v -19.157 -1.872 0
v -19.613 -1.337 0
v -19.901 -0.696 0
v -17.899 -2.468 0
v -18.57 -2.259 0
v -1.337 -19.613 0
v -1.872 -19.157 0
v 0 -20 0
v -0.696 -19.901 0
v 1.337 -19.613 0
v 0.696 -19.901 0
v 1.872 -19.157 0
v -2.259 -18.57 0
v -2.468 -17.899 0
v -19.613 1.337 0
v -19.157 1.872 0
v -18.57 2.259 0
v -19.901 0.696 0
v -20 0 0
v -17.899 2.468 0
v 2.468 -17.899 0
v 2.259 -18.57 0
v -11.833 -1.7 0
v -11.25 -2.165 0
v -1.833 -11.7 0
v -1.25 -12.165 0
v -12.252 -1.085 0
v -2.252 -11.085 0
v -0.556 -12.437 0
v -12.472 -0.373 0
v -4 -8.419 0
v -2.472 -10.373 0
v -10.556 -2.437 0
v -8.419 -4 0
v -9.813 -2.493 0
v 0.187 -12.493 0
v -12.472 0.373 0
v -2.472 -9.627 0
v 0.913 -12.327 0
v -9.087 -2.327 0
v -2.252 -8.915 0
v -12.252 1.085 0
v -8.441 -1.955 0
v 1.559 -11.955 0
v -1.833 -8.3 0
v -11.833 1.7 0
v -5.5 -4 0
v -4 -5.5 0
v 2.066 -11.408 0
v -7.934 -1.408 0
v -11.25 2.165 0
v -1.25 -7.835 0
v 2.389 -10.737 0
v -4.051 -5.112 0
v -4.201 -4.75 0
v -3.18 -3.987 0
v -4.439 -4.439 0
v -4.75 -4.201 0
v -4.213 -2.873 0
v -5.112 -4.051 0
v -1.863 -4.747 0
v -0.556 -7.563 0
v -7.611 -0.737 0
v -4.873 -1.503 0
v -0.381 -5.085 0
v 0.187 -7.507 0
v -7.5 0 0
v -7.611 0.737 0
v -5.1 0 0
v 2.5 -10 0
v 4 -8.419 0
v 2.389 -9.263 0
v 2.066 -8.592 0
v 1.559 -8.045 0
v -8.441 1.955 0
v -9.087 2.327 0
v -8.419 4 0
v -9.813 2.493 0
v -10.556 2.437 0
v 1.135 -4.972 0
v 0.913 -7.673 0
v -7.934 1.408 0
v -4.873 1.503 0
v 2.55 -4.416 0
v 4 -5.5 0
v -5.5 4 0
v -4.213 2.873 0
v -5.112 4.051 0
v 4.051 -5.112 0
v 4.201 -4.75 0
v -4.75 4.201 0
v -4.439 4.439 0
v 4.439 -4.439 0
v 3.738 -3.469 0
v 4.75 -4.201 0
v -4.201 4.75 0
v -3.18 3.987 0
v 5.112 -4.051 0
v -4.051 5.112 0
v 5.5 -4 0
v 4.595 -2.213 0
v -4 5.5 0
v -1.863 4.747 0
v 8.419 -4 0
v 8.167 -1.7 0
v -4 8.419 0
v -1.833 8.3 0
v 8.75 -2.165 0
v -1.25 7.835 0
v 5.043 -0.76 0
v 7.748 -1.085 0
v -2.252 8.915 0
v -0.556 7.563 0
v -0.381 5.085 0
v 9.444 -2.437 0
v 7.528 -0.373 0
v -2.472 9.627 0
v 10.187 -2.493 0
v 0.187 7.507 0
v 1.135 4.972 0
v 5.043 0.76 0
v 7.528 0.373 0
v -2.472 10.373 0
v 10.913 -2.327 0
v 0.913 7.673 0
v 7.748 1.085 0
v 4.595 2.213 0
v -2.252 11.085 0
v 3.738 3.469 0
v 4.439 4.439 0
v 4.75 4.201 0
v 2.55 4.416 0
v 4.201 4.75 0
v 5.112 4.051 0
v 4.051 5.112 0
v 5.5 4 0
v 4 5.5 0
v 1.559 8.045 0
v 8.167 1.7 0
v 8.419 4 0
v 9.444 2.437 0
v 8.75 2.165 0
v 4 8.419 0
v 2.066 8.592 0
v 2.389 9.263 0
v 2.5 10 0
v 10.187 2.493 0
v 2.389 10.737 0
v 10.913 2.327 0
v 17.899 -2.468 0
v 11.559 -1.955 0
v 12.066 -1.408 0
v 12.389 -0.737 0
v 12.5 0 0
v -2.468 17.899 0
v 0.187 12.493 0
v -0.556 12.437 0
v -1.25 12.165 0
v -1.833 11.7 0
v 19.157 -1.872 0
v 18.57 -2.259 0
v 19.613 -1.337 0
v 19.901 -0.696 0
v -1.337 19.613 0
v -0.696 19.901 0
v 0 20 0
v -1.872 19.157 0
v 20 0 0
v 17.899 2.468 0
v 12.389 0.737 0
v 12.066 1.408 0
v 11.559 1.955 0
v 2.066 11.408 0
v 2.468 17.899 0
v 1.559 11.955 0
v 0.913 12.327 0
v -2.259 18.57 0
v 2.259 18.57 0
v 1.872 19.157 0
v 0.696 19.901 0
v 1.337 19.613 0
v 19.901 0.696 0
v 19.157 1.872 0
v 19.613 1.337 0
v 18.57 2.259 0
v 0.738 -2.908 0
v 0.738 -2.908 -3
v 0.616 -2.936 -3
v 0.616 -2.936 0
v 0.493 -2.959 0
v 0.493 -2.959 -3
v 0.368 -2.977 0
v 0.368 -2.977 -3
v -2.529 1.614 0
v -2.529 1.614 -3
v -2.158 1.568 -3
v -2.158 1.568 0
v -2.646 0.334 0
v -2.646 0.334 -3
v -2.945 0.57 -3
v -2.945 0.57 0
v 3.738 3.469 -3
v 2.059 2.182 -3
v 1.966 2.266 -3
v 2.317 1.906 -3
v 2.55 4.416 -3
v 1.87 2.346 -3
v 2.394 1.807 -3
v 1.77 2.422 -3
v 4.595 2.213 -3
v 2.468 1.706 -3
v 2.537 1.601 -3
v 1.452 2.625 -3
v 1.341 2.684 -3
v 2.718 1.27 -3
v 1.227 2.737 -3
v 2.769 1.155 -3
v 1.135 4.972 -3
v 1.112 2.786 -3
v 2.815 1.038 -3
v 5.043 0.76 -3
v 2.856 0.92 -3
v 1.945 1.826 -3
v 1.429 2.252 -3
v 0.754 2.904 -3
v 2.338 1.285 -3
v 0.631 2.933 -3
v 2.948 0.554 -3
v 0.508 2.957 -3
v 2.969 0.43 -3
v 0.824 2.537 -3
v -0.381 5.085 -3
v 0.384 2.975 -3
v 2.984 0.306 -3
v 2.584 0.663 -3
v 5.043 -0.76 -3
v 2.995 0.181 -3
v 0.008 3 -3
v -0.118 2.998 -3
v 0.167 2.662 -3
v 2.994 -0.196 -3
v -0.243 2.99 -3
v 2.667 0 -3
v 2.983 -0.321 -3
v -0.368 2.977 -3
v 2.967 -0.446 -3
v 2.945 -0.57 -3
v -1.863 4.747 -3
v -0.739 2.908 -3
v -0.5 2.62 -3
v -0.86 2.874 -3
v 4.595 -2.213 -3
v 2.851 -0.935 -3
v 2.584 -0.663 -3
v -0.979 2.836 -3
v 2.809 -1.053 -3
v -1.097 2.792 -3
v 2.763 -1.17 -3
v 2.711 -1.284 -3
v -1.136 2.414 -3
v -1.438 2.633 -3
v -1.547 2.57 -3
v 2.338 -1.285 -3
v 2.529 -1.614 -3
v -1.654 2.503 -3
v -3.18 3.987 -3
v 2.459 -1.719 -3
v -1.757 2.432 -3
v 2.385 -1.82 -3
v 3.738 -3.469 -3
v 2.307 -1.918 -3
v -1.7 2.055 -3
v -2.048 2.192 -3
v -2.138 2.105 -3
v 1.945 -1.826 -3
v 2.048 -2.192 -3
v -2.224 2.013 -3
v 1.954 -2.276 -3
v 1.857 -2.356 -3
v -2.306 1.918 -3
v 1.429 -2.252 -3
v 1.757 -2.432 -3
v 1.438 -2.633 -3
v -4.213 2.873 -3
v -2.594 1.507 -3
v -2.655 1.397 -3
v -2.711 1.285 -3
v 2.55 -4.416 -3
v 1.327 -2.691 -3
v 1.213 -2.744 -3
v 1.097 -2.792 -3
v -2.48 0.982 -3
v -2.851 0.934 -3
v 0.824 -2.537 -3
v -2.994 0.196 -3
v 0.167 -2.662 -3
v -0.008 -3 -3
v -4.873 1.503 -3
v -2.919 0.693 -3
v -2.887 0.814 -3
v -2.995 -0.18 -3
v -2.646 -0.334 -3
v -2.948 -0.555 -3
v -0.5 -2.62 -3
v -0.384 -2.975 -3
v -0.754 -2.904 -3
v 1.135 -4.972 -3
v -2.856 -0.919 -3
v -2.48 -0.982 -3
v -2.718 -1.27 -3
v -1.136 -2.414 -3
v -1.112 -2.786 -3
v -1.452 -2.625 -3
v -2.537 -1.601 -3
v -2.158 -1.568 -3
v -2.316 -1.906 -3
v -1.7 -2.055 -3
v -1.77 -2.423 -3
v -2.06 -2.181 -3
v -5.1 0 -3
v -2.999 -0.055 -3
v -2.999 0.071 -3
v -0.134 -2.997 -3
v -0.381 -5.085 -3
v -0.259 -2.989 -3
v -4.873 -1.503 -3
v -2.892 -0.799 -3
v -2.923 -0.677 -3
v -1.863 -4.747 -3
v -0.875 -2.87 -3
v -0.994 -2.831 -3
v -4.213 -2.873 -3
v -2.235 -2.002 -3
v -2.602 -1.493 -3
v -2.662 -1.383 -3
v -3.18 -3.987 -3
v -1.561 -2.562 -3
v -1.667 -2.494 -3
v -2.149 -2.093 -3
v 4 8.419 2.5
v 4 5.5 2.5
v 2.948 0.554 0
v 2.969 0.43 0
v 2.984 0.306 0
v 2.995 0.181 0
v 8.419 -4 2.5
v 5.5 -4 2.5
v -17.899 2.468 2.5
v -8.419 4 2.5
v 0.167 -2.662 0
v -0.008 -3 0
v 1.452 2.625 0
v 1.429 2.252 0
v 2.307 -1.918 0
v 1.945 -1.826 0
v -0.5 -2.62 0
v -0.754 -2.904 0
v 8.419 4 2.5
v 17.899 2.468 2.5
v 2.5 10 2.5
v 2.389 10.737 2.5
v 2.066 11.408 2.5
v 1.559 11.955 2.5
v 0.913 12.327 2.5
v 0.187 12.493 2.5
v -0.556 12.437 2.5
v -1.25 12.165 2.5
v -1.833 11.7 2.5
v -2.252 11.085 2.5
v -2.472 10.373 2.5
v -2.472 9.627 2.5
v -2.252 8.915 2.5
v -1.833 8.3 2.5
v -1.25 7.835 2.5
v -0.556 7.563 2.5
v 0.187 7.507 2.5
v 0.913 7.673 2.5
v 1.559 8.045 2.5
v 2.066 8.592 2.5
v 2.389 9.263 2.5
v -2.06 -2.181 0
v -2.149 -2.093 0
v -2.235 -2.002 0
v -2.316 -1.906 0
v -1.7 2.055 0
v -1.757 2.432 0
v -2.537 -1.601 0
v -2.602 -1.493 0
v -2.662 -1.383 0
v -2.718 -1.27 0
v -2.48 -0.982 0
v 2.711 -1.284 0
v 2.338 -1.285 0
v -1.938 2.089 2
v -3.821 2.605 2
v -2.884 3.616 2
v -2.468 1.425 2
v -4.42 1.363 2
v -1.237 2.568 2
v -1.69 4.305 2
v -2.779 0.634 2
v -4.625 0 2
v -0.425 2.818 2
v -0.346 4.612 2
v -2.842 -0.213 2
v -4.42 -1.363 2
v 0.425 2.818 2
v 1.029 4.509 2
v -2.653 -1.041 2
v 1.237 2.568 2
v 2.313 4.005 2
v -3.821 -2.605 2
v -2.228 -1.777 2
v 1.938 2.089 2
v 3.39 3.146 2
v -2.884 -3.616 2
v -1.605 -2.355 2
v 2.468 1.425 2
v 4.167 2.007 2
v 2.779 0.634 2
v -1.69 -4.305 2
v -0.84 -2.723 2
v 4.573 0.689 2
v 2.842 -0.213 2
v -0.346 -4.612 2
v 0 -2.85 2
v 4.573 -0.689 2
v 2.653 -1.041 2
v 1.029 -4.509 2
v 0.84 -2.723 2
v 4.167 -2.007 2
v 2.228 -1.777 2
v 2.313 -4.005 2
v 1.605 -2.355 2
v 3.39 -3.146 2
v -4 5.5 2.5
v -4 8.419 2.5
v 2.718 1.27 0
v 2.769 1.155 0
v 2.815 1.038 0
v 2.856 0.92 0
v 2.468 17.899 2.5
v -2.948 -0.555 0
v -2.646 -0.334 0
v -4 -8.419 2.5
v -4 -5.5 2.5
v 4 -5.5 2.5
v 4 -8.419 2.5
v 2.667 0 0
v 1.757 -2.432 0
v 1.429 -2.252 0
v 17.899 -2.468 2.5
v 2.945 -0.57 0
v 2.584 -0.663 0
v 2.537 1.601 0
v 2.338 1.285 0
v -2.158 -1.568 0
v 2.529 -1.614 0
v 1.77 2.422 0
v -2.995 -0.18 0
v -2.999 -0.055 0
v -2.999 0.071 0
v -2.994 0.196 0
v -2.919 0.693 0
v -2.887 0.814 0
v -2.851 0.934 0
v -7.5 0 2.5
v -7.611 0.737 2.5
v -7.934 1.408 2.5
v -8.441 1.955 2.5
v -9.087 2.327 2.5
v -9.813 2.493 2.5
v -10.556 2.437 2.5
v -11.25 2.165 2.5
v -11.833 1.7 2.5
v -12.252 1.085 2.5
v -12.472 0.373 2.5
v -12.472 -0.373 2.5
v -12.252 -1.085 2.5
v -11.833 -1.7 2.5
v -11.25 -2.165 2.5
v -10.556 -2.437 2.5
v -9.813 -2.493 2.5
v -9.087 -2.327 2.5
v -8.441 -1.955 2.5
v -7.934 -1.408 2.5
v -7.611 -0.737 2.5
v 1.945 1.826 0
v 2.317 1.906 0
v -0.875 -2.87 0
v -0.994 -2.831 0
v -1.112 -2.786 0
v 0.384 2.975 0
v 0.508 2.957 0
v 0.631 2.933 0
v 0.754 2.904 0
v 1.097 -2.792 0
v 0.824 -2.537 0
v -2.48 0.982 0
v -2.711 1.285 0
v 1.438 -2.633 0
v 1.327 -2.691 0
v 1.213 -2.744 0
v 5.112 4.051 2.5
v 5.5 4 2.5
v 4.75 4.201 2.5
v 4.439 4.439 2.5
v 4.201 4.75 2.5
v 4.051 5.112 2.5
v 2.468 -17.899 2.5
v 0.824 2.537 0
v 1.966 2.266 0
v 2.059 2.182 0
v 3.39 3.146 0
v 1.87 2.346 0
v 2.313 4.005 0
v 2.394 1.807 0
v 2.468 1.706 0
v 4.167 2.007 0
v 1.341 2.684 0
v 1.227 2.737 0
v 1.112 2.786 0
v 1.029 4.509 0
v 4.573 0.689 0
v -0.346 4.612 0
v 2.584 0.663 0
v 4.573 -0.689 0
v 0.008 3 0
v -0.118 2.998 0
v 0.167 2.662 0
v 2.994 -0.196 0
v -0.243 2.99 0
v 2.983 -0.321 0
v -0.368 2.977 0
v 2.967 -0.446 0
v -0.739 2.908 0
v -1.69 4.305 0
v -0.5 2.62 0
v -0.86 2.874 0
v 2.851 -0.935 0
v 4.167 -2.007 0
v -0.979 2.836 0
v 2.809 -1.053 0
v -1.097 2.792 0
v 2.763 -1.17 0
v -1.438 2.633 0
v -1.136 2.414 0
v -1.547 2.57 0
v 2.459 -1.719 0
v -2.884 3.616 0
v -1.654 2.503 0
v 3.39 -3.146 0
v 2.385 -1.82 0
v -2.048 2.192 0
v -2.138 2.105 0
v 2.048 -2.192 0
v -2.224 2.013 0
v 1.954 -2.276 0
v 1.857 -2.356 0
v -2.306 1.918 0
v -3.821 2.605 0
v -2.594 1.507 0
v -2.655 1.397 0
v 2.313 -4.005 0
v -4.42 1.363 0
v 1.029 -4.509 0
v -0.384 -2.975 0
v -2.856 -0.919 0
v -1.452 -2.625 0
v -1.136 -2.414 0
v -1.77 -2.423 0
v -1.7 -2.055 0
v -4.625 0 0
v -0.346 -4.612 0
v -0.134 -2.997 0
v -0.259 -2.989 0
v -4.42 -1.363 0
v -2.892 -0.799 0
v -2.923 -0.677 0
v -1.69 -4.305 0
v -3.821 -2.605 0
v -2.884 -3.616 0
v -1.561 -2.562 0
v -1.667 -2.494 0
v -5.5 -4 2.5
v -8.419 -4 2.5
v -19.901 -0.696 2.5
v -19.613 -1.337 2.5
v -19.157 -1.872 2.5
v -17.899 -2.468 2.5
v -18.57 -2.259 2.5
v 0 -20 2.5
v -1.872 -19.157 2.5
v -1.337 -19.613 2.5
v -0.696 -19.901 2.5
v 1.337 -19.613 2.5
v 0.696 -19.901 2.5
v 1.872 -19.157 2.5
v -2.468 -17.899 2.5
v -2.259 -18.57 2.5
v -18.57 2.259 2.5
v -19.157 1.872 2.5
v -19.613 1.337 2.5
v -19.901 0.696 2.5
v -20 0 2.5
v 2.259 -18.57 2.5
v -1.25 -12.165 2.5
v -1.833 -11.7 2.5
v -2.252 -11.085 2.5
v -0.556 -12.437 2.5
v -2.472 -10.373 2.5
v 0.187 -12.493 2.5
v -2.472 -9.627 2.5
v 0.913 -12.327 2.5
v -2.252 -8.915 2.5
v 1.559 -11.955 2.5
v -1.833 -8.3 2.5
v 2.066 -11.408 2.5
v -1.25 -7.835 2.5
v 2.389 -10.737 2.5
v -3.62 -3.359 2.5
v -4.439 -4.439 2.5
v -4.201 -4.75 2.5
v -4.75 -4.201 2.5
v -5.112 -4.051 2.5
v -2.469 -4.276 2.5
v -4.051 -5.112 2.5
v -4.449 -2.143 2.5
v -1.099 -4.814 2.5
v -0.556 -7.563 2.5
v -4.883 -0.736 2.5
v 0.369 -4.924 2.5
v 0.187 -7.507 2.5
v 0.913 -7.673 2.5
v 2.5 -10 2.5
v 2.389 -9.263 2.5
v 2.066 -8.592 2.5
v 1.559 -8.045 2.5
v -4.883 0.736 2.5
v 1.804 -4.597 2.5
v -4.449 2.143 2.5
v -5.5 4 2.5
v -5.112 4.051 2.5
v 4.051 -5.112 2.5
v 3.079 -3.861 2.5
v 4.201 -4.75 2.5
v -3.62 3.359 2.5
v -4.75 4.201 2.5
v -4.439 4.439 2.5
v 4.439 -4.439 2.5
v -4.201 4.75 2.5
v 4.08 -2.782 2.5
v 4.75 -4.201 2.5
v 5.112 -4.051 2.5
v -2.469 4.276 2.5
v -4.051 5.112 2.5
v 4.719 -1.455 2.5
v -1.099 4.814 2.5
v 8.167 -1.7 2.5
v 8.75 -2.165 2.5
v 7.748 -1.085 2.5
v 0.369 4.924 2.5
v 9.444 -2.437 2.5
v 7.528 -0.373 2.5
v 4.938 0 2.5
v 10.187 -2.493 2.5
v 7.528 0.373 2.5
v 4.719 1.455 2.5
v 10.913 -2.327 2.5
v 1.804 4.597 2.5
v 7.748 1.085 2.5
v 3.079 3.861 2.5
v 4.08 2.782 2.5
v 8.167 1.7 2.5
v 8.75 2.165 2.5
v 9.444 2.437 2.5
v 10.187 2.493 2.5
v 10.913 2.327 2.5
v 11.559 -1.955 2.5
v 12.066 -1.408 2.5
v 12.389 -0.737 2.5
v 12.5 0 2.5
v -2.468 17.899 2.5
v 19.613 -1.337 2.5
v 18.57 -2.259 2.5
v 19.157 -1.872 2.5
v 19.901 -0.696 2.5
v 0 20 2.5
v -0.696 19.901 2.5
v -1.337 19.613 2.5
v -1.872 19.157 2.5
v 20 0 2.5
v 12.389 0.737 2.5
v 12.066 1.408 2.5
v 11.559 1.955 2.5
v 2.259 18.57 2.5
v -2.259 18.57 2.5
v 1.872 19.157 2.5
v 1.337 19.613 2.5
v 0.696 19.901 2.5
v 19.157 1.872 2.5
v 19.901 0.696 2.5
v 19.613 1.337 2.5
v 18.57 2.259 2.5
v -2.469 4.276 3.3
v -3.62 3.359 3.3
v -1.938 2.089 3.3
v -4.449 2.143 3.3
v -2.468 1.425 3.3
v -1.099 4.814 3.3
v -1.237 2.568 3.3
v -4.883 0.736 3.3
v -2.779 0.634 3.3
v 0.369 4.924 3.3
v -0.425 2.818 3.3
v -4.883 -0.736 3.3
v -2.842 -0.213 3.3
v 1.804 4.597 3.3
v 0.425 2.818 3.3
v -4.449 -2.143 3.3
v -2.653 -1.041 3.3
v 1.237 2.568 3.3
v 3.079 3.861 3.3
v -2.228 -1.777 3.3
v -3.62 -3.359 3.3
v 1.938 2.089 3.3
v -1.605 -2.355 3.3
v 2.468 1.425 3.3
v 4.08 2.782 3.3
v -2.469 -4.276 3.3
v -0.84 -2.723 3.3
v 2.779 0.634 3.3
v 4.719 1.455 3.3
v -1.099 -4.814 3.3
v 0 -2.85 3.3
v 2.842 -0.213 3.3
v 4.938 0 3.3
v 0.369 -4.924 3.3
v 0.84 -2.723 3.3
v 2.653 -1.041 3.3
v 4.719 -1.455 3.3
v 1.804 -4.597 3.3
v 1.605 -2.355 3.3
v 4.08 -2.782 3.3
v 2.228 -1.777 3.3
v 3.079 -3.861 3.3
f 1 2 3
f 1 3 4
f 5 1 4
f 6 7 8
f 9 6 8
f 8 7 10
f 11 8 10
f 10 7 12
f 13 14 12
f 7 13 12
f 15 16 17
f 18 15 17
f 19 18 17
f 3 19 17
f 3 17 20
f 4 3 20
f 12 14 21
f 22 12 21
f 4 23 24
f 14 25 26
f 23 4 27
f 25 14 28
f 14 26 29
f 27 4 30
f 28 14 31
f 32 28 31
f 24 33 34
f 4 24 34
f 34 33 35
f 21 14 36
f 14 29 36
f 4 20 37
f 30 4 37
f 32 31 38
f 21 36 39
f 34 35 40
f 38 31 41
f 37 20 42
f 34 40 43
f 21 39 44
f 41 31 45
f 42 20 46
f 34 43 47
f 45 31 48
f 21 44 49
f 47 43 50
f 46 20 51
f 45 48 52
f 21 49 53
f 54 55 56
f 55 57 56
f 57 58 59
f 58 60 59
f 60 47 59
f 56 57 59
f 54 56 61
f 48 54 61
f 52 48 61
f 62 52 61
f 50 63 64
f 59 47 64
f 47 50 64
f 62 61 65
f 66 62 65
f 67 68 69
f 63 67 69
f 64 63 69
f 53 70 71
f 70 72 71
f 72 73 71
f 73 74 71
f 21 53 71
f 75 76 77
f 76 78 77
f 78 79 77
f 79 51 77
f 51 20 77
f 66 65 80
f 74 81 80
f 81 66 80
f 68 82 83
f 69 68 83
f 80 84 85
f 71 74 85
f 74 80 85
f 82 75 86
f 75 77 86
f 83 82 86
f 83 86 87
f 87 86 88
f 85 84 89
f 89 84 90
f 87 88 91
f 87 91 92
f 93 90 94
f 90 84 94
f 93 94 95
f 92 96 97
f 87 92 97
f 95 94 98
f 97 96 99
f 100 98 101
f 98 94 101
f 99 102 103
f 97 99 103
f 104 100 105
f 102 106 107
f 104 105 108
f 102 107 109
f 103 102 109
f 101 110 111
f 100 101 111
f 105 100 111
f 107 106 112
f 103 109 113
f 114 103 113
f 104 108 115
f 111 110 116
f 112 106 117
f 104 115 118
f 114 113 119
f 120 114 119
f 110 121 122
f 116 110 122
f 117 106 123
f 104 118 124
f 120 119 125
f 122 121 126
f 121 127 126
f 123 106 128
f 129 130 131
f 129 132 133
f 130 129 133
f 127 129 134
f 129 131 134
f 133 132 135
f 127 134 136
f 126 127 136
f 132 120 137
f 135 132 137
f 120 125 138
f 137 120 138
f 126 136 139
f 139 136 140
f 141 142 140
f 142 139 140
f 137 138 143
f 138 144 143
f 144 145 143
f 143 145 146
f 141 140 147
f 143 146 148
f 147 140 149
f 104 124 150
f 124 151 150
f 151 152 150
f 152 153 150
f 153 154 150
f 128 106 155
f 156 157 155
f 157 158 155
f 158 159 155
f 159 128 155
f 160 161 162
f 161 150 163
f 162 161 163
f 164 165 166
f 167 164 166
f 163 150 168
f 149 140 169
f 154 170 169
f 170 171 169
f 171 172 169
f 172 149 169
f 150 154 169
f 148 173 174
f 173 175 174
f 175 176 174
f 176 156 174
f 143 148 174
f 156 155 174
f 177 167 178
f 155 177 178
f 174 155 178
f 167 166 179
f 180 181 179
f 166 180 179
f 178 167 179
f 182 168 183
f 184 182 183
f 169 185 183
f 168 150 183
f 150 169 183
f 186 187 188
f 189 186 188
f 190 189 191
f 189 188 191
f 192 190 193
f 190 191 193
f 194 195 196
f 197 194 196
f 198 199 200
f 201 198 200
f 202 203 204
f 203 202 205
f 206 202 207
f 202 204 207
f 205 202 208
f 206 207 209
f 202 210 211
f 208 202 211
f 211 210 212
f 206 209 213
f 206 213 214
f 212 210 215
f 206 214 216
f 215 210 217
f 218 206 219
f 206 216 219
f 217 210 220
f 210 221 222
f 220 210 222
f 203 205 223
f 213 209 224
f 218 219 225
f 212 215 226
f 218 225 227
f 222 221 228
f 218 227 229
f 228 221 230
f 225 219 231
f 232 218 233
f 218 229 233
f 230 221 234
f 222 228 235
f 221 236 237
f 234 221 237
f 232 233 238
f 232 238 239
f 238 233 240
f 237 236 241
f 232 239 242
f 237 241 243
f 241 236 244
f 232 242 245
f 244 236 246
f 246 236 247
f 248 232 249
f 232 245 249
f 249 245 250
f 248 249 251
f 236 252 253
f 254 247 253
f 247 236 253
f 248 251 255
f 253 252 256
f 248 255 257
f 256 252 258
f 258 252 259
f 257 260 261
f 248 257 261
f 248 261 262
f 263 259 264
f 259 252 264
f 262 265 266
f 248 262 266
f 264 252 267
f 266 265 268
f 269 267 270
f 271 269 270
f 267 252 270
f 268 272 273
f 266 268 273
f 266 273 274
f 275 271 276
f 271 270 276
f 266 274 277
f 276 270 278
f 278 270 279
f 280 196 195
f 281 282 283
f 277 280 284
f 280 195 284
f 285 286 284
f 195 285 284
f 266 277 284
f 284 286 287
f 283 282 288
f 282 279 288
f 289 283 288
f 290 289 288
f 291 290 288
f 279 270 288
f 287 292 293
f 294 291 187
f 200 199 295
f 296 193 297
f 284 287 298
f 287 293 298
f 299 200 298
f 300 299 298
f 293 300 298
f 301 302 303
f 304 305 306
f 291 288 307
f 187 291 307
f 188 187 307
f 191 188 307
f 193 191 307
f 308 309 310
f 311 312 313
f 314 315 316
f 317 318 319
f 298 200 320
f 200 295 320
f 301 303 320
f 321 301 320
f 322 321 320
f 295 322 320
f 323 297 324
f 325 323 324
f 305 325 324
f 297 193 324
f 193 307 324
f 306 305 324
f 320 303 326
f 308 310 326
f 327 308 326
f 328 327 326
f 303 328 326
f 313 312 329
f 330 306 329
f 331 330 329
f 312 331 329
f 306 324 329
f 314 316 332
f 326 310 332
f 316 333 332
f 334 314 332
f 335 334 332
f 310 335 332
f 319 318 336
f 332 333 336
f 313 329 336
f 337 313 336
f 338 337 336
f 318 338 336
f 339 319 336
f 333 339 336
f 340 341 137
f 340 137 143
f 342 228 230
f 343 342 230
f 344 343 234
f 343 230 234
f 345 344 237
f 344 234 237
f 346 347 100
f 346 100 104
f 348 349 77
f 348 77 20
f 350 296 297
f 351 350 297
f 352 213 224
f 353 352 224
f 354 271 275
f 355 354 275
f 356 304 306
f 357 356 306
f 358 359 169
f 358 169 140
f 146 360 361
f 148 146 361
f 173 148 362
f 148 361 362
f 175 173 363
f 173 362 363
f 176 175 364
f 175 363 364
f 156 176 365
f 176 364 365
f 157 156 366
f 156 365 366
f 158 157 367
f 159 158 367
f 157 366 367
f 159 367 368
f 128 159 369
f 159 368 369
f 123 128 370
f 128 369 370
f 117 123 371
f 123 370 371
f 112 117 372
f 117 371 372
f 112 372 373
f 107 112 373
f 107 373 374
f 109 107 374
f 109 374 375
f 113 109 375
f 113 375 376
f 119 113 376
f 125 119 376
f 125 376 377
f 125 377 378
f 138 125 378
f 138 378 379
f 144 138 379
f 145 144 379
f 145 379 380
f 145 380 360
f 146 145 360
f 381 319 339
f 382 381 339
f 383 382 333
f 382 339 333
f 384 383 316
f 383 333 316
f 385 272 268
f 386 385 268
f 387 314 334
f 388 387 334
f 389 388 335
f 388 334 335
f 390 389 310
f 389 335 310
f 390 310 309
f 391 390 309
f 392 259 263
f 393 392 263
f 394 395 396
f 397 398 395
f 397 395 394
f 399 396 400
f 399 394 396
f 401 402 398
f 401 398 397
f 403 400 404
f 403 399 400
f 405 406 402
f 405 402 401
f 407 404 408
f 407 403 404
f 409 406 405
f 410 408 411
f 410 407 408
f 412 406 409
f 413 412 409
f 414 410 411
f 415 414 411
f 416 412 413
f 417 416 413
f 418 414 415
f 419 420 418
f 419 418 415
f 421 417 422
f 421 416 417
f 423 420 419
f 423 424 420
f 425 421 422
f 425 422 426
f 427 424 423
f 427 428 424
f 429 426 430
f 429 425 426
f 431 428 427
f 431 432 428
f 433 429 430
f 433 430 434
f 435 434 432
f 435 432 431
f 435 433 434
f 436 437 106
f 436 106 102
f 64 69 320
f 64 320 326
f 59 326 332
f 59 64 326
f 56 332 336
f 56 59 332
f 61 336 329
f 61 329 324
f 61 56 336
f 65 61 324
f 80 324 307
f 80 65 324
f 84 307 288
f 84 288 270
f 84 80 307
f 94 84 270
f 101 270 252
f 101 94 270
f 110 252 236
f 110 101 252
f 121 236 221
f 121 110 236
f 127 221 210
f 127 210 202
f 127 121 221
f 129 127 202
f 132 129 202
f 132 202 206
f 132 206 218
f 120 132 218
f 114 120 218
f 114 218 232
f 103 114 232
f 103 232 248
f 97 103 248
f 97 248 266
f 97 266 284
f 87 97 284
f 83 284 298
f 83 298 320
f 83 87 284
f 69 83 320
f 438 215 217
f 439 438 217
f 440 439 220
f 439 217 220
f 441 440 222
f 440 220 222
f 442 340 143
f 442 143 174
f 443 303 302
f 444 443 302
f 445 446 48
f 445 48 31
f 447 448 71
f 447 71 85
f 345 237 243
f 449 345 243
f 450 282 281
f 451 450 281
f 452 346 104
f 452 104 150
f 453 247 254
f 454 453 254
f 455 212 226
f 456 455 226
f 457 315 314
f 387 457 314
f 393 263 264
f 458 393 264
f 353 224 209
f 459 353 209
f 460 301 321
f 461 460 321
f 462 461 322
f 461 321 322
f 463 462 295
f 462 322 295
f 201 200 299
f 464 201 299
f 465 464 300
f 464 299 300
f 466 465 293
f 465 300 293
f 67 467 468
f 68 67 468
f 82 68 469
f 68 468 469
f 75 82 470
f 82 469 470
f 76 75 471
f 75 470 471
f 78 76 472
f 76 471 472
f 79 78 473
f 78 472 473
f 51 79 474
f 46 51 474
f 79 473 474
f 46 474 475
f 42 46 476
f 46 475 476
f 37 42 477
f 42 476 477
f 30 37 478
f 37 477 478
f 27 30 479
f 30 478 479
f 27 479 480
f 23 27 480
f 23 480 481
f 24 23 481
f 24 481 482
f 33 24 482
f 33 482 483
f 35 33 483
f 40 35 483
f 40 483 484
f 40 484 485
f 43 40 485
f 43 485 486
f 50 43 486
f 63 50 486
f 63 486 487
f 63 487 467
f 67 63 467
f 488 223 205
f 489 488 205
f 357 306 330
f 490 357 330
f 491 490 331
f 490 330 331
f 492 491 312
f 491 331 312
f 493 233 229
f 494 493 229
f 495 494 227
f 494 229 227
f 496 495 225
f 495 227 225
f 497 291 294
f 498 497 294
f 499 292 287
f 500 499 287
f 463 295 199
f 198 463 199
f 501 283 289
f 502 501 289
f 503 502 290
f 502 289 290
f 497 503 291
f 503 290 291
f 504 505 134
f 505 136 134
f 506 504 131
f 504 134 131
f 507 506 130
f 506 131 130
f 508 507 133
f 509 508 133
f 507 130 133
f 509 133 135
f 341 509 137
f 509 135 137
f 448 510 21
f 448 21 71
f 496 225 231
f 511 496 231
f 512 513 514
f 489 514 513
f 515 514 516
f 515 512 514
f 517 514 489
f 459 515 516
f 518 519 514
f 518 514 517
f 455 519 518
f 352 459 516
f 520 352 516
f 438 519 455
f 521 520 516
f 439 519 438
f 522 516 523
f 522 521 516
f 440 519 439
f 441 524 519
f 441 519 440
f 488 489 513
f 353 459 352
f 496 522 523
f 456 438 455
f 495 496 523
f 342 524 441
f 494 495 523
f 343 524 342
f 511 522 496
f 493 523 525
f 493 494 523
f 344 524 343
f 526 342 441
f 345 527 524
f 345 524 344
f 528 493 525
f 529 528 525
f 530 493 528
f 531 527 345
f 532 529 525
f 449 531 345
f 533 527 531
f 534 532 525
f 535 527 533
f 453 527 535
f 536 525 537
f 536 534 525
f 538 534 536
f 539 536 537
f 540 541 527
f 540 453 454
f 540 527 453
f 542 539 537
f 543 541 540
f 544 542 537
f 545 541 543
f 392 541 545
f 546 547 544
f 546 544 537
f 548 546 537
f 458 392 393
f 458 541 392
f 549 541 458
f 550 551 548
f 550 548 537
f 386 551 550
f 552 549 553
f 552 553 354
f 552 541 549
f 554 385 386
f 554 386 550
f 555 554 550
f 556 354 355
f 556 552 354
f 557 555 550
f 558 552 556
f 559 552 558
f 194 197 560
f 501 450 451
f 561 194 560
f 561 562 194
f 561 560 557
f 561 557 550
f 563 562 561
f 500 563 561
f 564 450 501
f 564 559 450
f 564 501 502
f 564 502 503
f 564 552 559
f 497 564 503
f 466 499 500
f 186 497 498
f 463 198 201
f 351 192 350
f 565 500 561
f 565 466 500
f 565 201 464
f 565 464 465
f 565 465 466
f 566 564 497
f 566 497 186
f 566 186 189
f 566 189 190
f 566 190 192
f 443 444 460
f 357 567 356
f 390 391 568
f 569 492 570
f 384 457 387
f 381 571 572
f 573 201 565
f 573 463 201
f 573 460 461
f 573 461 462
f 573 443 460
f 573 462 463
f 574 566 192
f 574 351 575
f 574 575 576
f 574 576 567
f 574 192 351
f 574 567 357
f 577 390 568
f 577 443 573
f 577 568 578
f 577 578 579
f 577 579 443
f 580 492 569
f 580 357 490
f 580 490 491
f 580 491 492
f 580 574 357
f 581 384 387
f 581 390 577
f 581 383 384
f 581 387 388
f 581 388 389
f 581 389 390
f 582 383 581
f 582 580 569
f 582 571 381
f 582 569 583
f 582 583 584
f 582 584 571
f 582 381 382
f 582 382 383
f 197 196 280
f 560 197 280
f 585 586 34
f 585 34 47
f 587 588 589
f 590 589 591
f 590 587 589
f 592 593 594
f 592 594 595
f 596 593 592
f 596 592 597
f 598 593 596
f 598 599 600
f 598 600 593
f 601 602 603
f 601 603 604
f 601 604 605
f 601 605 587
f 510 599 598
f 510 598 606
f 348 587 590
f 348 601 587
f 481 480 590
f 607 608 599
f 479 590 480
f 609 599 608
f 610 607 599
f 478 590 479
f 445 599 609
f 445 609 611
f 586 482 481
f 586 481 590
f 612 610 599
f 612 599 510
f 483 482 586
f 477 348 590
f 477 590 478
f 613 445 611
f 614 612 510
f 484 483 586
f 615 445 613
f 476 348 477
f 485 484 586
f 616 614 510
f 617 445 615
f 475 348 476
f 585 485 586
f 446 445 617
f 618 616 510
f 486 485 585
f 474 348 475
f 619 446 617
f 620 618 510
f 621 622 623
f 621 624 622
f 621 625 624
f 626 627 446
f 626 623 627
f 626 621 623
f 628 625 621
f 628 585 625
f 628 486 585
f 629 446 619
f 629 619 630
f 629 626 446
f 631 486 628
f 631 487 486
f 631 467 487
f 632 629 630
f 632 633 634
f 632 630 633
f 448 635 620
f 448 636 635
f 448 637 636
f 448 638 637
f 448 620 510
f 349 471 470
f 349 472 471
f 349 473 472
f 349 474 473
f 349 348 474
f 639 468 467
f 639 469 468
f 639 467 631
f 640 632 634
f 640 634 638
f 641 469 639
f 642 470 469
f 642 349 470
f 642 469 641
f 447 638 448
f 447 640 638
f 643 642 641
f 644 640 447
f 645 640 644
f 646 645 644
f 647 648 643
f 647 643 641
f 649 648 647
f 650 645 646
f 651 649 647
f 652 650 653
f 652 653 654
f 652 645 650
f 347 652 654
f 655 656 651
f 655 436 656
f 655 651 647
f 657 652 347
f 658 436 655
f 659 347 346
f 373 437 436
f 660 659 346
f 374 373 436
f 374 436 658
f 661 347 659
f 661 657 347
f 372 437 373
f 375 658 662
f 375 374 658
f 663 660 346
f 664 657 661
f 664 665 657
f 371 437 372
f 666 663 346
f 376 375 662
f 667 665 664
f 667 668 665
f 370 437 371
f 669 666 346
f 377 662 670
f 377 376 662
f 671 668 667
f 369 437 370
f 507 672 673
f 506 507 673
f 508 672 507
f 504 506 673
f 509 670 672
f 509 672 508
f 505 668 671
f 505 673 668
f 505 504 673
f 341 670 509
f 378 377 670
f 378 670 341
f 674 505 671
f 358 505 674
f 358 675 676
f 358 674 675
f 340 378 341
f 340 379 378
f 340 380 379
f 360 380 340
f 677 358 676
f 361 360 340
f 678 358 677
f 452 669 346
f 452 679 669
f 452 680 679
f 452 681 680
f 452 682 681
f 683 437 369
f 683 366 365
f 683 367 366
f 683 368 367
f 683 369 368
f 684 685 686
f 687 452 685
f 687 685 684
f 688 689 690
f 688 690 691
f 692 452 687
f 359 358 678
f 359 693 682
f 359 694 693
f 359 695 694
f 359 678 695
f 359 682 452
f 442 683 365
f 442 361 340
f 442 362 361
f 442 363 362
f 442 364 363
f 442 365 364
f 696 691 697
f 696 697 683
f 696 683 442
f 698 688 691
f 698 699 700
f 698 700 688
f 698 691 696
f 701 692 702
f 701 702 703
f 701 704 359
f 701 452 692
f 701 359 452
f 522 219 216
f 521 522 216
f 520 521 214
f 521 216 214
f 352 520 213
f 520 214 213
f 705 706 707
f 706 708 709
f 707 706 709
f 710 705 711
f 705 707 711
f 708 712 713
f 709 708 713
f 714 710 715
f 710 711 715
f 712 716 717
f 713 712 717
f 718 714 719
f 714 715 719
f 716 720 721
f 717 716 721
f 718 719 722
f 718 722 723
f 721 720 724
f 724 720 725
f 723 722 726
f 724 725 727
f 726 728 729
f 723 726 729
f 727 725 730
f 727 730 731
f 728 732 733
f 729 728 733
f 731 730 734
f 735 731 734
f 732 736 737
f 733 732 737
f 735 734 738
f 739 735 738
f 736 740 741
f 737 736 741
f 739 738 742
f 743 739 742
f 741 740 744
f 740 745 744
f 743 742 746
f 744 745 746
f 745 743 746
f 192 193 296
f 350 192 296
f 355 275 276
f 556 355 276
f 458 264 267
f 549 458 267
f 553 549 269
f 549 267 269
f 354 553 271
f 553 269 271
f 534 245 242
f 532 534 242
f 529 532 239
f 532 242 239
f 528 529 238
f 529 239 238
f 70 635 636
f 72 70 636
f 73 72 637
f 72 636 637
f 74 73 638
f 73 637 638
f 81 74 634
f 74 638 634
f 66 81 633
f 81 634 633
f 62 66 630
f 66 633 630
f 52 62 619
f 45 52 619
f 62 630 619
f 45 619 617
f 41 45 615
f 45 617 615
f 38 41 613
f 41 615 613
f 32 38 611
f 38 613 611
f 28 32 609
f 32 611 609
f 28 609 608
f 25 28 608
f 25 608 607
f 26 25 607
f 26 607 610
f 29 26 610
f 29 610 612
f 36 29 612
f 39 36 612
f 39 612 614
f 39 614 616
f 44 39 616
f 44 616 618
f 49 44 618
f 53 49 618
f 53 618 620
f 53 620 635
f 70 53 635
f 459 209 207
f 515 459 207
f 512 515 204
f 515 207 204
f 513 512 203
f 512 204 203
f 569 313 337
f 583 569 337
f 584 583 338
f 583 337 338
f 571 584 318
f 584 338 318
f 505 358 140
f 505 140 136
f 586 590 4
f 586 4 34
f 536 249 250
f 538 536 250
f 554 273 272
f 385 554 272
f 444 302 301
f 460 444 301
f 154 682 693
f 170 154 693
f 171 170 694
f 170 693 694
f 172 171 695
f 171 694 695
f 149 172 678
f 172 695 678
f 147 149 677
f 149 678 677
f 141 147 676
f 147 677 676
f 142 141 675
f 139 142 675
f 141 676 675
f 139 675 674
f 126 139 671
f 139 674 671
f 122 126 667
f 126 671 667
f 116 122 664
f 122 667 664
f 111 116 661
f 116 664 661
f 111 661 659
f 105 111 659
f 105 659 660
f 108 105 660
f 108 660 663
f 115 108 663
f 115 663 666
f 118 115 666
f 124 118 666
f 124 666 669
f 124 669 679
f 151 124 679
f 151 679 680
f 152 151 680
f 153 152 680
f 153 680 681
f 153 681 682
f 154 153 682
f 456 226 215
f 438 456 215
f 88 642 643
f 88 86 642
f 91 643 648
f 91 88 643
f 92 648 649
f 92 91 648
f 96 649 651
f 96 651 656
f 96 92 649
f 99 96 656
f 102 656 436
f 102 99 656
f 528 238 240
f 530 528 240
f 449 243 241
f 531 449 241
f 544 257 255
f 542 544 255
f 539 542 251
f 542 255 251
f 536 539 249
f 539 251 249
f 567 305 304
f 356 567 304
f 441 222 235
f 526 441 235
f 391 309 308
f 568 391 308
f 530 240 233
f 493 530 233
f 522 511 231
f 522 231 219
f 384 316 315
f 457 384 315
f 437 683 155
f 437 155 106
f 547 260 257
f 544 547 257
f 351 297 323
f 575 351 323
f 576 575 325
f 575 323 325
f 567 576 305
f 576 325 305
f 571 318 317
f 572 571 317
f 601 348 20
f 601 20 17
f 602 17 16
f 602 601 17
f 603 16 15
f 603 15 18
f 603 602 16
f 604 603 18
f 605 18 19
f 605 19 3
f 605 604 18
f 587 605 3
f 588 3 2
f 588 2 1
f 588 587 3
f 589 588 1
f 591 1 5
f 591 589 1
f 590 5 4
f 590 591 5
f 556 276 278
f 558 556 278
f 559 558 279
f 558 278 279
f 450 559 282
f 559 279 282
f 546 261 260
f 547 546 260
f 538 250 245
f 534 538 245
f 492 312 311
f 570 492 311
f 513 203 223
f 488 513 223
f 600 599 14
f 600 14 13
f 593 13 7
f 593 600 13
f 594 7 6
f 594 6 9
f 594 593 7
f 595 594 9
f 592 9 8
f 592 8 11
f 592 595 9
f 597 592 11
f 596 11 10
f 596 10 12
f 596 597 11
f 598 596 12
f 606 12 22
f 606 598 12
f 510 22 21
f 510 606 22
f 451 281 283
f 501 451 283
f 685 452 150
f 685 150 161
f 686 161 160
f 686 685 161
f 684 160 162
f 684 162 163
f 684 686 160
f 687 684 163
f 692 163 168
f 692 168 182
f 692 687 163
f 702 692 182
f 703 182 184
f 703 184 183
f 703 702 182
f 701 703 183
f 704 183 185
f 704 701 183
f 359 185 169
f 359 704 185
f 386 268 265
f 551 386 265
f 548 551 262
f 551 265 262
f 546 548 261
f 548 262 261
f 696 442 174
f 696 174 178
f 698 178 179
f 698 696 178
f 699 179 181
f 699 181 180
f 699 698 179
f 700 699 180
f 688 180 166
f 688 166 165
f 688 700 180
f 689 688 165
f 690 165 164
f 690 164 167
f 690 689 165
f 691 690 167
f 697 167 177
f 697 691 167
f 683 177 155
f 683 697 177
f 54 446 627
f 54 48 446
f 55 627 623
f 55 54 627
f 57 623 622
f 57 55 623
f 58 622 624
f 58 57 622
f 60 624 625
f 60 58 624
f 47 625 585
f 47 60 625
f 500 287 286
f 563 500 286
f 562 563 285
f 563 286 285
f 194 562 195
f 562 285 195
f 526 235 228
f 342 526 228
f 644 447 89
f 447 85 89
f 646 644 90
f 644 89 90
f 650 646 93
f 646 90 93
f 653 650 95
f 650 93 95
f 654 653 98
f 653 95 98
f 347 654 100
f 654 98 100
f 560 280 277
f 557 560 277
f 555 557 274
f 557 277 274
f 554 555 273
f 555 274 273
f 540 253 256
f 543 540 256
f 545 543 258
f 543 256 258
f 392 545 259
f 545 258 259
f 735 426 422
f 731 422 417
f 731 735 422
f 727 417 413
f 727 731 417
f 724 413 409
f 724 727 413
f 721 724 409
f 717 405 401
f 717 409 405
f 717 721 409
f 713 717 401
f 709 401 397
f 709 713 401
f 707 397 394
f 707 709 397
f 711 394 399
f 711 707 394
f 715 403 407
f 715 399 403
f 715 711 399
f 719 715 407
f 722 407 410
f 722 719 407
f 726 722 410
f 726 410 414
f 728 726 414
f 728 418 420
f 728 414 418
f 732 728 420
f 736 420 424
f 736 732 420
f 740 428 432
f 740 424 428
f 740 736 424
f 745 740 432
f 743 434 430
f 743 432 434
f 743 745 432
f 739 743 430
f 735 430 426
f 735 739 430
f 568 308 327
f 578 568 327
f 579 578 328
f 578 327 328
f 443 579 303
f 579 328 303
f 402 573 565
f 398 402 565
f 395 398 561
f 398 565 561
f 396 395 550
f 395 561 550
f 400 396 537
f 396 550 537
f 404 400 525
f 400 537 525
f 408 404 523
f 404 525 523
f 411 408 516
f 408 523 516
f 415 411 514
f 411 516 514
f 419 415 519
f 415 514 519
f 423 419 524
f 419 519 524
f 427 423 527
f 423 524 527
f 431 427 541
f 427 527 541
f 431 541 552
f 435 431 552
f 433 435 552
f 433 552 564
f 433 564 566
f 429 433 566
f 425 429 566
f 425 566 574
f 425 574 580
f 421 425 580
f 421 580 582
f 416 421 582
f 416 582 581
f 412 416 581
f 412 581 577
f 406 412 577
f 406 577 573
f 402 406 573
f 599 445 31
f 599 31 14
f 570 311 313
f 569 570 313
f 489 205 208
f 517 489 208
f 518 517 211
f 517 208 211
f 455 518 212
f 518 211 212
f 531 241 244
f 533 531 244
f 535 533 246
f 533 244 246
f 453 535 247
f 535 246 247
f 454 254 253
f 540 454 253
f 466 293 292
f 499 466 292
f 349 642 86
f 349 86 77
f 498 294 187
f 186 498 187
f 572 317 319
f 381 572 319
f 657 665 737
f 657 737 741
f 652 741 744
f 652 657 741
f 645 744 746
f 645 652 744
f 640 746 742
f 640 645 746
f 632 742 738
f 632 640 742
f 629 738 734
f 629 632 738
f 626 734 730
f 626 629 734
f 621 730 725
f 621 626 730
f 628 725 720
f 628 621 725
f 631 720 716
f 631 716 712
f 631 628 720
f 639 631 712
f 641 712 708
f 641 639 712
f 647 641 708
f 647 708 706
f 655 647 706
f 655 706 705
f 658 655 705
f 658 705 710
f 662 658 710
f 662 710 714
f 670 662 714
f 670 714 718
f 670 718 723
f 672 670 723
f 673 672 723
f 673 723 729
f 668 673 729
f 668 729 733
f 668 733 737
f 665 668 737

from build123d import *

# Parameters (mm, degrees)
BOSS_EXTRUDE1_DEPTH  = 2.5
M8_CLEARANCE_HOLE1_D = 9.25
SKETCH4_R            = 4.937986177
BOSS_EXTRUDE2_DEPTH  = 1.3
SKETCH5_R            = 5.099596851
BOSS_EXTRUDE3_DEPTH  = 3
CUT_EXTRUDE1_DEPTH   = 3.6
FILLET1_R            = 1.5
SKETCH11_R           = 2.5
CUT_EXTRUDE2_DEPTH   = 10


with BuildPart() as part:
    # Sketch1 → Boss-Extrude1 (new body)
    with BuildSketch(Plane.XY.offset(2.5)):
        with BuildLine():
            Line((4, -8.419183588), (4, -4))
            Line((4, -4), (8.419183588, -4))
            Line((8.419183588, -4), (17.898853189, -2.467978147))
            ThreePointArc((17.898853189, -2.467978147), (20, 0), (17.898853189, 2.467978147))
            Line((17.898853189, 2.467978147), (8.419183588, 4))
            Line((8.419183588, 4), (4, 4))
            Line((4, 4), (4, 8.419183588))
            Line((4, 8.419183588), (2.467978147, 17.898853189))
            ThreePointArc((2.467978147, 17.898853189), (0, 20), (-2.467978147, 17.898853189))
            Line((-2.467978147, 17.898853189), (-4, 8.419183588))
            Line((-4, 8.419183588), (-4, 4))
            Line((-4, 4), (-8.419183588, 4))
            Line((-8.419183588, 4), (-17.898853189, 2.467978147))
            ThreePointArc((-17.898853189, 2.467978147), (-20, 0), (-17.898853189, -2.467978147))
            Line((-17.898853189, -2.467978147), (-8.419183588, -4))
            Line((-8.419183588, -4), (-4, -4))
            Line((-4, -4), (-4, -8.419183588))
            Line((-4, -8.419183588), (-2.467978147, -17.898853189))
            ThreePointArc((-2.467978147, -17.898853189), (0, -20), (2.467978147, -17.898853189))
            Line((2.467978147, -17.898853189), (4, -8.419183588))
        make_face()
    extrude(amount=-BOSS_EXTRUDE1_DEPTH)

    # M8 Clearance Hole1 (through all)
    with Locations(Plane.XY.offset(2.5)):
        with Locations((0, 0)):
            Hole(M8_CLEARANCE_HOLE1_D / 2)

    # Sketch4 → Boss-Extrude2 (add)
    with BuildSketch(Plane(origin=(0, 0, 2), x_dir=(-1, 0, 0), z_dir=(0, 0, -1))):
        with Locations(Location((0, 0, 0), (0, 0, 180))):
            Circle(SKETCH4_R)
    extrude(amount=-BOSS_EXTRUDE2_DEPTH)

    # Sketch5 → Boss-Extrude3 (add)
    with BuildSketch(Plane.XY):
        with Locations(Location((0, 0, 0), (0, 0, 180))):
            Circle(SKETCH5_R)
    extrude(amount=-BOSS_EXTRUDE3_DEPTH)

    # Sketch6 → Cut-Extrude1 (cut)
    with BuildSketch(Plane(origin=(0, 0, -3), x_dir=(-1, 0, 0), z_dir=(0, 0, -1))):
        with BuildLine():
            Line((-2.994554723, 0.180671), (-2.667483, 0))
            Line((-2.667483, 0), (-2.993563417, -0.196413))
            ThreePointArc((-2.993563417, -0.196413), (-2.975345367, -0.383822804), (-2.94540633, -0.569720588))
            Line((-2.94540633, -0.569720588), (-2.583679116, -0.663376046))
            Line((-2.583679116, -0.663376046), (-2.850669191, -0.934711273))
            ThreePointArc((-2.850669191, -0.934711273), (-2.786416572, -1.111702609), (-2.711187226, -1.284314536))
            Line((-2.711187226, -1.284314536), (-2.337533172, -1.285069736))
            Line((-2.337533172, -1.285069736), (-2.528656935, -1.614278199))
            ThreePointArc((-2.528656935, -1.614278199), (-2.422406975, -1.76973005), (-2.306614256, -1.918210278))
            Line((-2.306614256, -1.918210278), (-1.944511421, -1.826017768))
            Line((-1.944511421, -1.826017768), (-2.047759865, -2.192414089))
            ThreePointArc((-2.047759865, -2.192414089), (-1.906188639, -2.316558843), (-1.75710823, -2.431577814))
            Line((-1.75710823, -2.431577814), (-1.429308867, -2.252230388))
            Line((-1.429308867, -2.252230388), (-1.438194511, -2.632792538))
            ThreePointArc((-1.438194511, -2.632792538), (-1.27019746, -2.717829725), (-1.097196632, -2.792160373))
            Line((-1.097196632, -2.792160373), (-0.824297579, -2.536927089))
            Line((-0.824297579, -2.536927089), (-0.738262106, -2.90774295))
            ThreePointArc((-0.738262106, -2.90774295), (-0.554395104, -2.948329369), (-0.368344134, -2.977301227))
            Line((-0.368344134, -2.977301227), (-0.167492643, -2.662219332))
            Line((-0.167492643, -2.662219332), (0.008058022, -2.999989178))
            ThreePointArc((0.008058022, -2.999989178), (0.196241936, -2.993574636), (0.383652781, -2.975367296))
            Line((0.383652781, -2.975367296), (0.499836471, -2.620234542))
            Line((0.499836471, -2.620234542), (0.753871834, -2.903735053))
            ThreePointArc((0.753871834, -2.903735053), (0.934548373, -2.850722599), (1.11154338, -2.786480094))
            Line((1.11154338, -2.786480094), (1.135759022, -2.41361078))
            Line((1.135759022, -2.41361078), (1.452317107, -2.625028575))
            ThreePointArc((1.452317107, -2.625028575), (1.614133699, -2.528749177), (1.769591621, -2.4225081))
            Line((1.769591621, -2.4225081), (1.700317656, -2.055330976))
            Line((1.700317656, -2.055330976), (2.059507955, -2.181381898))
            ThreePointArc((2.059507955, -2.181381898), (2.192297068, -2.047885144), (2.316449912, -1.906321013))
            Line((2.316449912, -1.906321013), (2.158039079, -1.567907168))
            Line((2.158039079, -1.567907168), (2.537292343, -1.600670974))
            ThreePointArc((2.537292343, -1.600670974), (2.63271035, -1.438344956), (2.717757136, -1.270352765))
            Line((2.717757136, -1.270352765), (2.48016297, -0.981965986))
            Line((2.48016297, -0.981965986), (2.855649322, -0.919384005))
            ThreePointArc((2.855649322, -0.919384005), (2.907700758, -0.738428265), (2.948297684, -0.554563582))
            Line((2.948297684, -0.554563582), (2.6464491, -0.33432427))
            Line((2.6464491, -0.33432427), (2.994575352, -0.180328758))
            ThreePointArc((2.994575352, -0.180328758), (2.999989634, 0.007886591), (2.993585845, 0.196070871))
            Line((2.993585845, 0.196070871), (2.6464491, 0.33432427))
            Line((2.6464491, 0.33432427), (2.945341199, 0.570057208))
            ThreePointArc((2.945341199, 0.570057208), (2.903778127, 0.753705902), (2.850775998, 0.93438547))
            Line((2.850775998, 0.93438547), (2.48016297, 0.981965986))
            Line((2.48016297, 0.981965986), (2.711040427, 1.284624383))
            ThreePointArc((2.711040427, 1.284624383), (2.625111562, 1.4521671), (2.528841411, 1.613989194))
            Line((2.528841411, 1.613989194), (2.158039079, 1.567907168))
            Line((2.158039079, 1.567907168), (2.306395014, 1.918473883))
            ThreePointArc((2.306395014, 1.918473883), (2.181499583, 2.059383299), (2.048010417, 2.192180041))
            Line((2.048010417, 2.192180041), (1.700317656, 2.055330976))
            Line((1.700317656, 2.055330976), (1.756830319, 2.431778614))
            ThreePointArc((1.756830319, 2.431778614), (1.600815962, 2.53720087), (1.438495397, 2.632628153))
            Line((1.438495397, 2.632628153), (1.135759022, 2.41361078))
            Line((1.135759022, 2.41361078), (1.096877515, 2.792285751))
            ThreePointArc((1.096877515, 2.792285751), (0.919547186, 2.85559678), (0.73859442, 2.907658557))
            Line((0.73859442, 2.907658557), (0.499836471, 2.620234542))
            Line((0.499836471, 2.620234542), (0.368003863, 2.977343305))
            ThreePointArc((0.368003863, 2.977343305), (0.180499879, 2.994565042), (-0.00771516, 2.999990079))
            Line((-0.00771516, 2.999990079), (-0.167492643, 2.662219332))
            Line((-0.167492643, 2.662219332), (-0.383992826, 2.975323429))
            ThreePointArc((-0.383992826, 2.975323429), (-0.569888899, 2.94537377), (-0.753539968, 2.903821192))
            Line((-0.753539968, 2.903821192), (-0.824297579, 2.536927089))
            Line((-0.824297579, 2.536927089), (-1.111861833, 2.78635304))
            ThreePointArc((-1.111861833, 2.78635304), (-1.284469462, 2.711113831), (-1.452017089, 2.62519454))
            Line((-1.452017089, 2.62519454), (-1.429308867, 2.252230388))
            Line((-1.429308867, 2.252230388), (-1.769868472, 2.422305842))
            ThreePointArc((-1.769868472, 2.422305842), (-1.918342084, 2.306504639), (-2.059258636, 2.18161726))
            Line((-2.059258636, 2.18161726), (-1.944511421, 1.826017768))
            Line((-1.944511421, 1.826017768), (-2.316667766, 1.906056259))
            ThreePointArc((-2.316667766, 1.906056259), (-2.431678218, 1.756969278), (-2.53710939, 1.600960944))
            Line((-2.53710939, 1.600960944), (-2.337533172, 1.285069736))
            Line((-2.337533172, 1.285069736), (-2.717902304, 1.270042151))
            ThreePointArc((-2.717902304, 1.270042151), (-2.792223067, 1.097037075), (-2.855544229, 0.919710365))
            Line((-2.855544229, 0.919710365), (-2.583679116, 0.663376046))
            Line((-2.583679116, 0.663376046), (-2.948361045, 0.554226624))
            ThreePointArc((-2.948361045, 0.554226624), (-2.977322271, 0.368173999), (-2.994554723, 0.180671))
        make_face()
    extrude(amount=-CUT_EXTRUDE1_DEPTH, mode=Mode.SUBTRACT)

    # Sketch9 → CBORE for M2.5 Hex Head Machine Screw1 (revolve, cut)
    with BuildSketch(Plane(origin=(0, 0, 3.3), x_dir=(0, -1, 0), z_dir=(1, 0, 0))):
        Polygon((0, 0), (0, 1.3), (1.5, 1.3), (1.5, 1.5), (2.85, 1.5), (2.85, 0), align=None)
    revolve(axis=Axis((0, 0, 9.65), (0, 0, -1)), mode=Mode.SUBTRACT)

    # Fillet1
    fillet1_edges = [part.edges().sort_by_distance(p)[0] for p in [
        (-4, -4, 1.25),
        (-4, 4, 1.25),
        (4, 4, 1.25),
        (4, -4, 1.25),
    ]]
    fillet(fillet1_edges, radius=FILLET1_R)

    # Sketch11 → Cut-Extrude2 (cut)
    with BuildSketch(Plane.XY.offset(2.5)):
        with Locations((-10, 0)):
            Circle(SKETCH11_R)
        with Locations((10, 0)):
            Circle(SKETCH11_R)
        with Locations((0, -10)):
            Circle(SKETCH11_R)
        with Locations((0, 10)):
            Circle(SKETCH11_R)
    extrude(amount=-CUT_EXTRUDE2_DEPTH, mode=Mode.SUBTRACT)


solid = part.part
